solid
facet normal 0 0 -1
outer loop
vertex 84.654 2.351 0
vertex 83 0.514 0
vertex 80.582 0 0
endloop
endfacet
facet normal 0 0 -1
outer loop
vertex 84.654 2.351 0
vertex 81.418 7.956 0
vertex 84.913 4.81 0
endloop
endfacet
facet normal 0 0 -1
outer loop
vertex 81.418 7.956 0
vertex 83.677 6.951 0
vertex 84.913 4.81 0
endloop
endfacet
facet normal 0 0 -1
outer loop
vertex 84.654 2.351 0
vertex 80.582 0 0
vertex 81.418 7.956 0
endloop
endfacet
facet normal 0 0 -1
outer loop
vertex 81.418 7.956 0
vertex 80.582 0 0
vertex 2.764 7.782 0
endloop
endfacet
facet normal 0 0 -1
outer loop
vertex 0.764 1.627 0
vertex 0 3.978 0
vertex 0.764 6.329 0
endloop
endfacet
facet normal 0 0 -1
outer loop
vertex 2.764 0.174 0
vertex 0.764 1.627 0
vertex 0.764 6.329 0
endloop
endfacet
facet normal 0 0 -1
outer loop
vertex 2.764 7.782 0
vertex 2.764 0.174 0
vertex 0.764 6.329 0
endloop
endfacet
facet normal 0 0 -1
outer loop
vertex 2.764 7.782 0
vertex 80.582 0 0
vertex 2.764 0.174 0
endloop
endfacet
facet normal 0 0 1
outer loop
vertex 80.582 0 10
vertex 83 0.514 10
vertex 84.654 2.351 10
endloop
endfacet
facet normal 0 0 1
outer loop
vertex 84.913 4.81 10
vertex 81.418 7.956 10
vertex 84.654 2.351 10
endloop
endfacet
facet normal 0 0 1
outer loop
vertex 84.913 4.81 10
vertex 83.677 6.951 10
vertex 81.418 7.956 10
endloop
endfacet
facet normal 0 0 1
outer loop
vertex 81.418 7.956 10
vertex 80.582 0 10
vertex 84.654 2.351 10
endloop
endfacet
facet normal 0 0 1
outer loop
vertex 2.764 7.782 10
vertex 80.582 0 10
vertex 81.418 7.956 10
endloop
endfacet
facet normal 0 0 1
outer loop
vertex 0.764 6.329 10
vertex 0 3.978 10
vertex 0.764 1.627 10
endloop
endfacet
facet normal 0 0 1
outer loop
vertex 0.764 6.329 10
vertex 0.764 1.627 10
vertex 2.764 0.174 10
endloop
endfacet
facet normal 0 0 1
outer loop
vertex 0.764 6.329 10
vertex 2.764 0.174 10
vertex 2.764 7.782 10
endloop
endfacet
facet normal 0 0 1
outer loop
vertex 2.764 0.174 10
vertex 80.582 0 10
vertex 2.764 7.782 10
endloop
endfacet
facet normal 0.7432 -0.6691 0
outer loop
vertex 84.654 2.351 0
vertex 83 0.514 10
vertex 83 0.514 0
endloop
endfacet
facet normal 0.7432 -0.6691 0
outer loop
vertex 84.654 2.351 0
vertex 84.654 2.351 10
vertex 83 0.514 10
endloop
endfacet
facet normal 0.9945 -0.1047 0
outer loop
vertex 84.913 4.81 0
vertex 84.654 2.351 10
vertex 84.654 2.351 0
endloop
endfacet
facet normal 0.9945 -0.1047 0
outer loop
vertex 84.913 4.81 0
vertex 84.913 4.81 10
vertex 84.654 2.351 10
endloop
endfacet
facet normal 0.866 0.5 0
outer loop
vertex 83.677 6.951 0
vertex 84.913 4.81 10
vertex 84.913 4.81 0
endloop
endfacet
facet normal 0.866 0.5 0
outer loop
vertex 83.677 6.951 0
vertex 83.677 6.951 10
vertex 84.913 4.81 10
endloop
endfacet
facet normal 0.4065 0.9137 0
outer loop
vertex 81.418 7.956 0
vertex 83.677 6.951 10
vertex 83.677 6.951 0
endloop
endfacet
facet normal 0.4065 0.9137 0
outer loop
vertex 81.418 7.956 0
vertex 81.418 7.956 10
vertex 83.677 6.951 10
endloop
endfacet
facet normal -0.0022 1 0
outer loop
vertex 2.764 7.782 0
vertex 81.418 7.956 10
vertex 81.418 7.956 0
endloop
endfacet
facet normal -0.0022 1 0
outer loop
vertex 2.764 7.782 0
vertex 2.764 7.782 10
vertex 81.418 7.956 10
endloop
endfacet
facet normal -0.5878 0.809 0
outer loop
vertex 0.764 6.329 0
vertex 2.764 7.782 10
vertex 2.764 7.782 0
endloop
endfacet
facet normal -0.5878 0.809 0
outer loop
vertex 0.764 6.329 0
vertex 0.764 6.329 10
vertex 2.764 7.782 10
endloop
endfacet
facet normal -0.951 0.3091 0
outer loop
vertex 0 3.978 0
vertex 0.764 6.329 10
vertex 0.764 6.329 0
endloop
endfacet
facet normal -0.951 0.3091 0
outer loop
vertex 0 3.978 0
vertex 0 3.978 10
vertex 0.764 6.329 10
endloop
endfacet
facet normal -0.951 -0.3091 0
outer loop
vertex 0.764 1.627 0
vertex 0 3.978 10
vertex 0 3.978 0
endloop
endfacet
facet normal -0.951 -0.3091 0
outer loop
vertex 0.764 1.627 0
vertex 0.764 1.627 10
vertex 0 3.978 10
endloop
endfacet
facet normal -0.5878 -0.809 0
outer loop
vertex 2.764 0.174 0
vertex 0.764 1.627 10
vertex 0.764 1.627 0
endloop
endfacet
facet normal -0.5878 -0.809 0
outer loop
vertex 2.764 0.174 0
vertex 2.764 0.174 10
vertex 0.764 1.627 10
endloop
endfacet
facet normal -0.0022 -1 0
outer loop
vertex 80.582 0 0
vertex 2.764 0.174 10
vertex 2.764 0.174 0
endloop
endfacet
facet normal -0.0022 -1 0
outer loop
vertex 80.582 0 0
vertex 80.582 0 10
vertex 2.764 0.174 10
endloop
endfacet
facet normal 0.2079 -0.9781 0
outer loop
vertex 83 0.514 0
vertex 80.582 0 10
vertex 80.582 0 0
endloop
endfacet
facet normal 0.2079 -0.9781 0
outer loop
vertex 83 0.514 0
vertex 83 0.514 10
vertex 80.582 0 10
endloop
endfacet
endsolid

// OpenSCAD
$fn = 32;

// ----------------------------------------------------------------------
// Key bar: parallel key, 10 mm thick
// ----------------------------------------------------------------------

// --- parameters (mm) ---
profile_height = 10;      // extrusion height
profile_points = 11;      // points of the closed outline

profile = [[0, 3.978], [0.764, 1.627], [2.764, 0.174], [80.582, 0], [83, 0.514], [84.654, 2.351], [84.913, 4.81], [83.677, 6.951], [81.418, 7.956], [2.764, 7.782], [0.764, 6.329]];  // single closed polygon, 11 points, counter clockwise

// --- the one profile operation ---
linear_extrude(height = profile_height) polygon(points = profile);
